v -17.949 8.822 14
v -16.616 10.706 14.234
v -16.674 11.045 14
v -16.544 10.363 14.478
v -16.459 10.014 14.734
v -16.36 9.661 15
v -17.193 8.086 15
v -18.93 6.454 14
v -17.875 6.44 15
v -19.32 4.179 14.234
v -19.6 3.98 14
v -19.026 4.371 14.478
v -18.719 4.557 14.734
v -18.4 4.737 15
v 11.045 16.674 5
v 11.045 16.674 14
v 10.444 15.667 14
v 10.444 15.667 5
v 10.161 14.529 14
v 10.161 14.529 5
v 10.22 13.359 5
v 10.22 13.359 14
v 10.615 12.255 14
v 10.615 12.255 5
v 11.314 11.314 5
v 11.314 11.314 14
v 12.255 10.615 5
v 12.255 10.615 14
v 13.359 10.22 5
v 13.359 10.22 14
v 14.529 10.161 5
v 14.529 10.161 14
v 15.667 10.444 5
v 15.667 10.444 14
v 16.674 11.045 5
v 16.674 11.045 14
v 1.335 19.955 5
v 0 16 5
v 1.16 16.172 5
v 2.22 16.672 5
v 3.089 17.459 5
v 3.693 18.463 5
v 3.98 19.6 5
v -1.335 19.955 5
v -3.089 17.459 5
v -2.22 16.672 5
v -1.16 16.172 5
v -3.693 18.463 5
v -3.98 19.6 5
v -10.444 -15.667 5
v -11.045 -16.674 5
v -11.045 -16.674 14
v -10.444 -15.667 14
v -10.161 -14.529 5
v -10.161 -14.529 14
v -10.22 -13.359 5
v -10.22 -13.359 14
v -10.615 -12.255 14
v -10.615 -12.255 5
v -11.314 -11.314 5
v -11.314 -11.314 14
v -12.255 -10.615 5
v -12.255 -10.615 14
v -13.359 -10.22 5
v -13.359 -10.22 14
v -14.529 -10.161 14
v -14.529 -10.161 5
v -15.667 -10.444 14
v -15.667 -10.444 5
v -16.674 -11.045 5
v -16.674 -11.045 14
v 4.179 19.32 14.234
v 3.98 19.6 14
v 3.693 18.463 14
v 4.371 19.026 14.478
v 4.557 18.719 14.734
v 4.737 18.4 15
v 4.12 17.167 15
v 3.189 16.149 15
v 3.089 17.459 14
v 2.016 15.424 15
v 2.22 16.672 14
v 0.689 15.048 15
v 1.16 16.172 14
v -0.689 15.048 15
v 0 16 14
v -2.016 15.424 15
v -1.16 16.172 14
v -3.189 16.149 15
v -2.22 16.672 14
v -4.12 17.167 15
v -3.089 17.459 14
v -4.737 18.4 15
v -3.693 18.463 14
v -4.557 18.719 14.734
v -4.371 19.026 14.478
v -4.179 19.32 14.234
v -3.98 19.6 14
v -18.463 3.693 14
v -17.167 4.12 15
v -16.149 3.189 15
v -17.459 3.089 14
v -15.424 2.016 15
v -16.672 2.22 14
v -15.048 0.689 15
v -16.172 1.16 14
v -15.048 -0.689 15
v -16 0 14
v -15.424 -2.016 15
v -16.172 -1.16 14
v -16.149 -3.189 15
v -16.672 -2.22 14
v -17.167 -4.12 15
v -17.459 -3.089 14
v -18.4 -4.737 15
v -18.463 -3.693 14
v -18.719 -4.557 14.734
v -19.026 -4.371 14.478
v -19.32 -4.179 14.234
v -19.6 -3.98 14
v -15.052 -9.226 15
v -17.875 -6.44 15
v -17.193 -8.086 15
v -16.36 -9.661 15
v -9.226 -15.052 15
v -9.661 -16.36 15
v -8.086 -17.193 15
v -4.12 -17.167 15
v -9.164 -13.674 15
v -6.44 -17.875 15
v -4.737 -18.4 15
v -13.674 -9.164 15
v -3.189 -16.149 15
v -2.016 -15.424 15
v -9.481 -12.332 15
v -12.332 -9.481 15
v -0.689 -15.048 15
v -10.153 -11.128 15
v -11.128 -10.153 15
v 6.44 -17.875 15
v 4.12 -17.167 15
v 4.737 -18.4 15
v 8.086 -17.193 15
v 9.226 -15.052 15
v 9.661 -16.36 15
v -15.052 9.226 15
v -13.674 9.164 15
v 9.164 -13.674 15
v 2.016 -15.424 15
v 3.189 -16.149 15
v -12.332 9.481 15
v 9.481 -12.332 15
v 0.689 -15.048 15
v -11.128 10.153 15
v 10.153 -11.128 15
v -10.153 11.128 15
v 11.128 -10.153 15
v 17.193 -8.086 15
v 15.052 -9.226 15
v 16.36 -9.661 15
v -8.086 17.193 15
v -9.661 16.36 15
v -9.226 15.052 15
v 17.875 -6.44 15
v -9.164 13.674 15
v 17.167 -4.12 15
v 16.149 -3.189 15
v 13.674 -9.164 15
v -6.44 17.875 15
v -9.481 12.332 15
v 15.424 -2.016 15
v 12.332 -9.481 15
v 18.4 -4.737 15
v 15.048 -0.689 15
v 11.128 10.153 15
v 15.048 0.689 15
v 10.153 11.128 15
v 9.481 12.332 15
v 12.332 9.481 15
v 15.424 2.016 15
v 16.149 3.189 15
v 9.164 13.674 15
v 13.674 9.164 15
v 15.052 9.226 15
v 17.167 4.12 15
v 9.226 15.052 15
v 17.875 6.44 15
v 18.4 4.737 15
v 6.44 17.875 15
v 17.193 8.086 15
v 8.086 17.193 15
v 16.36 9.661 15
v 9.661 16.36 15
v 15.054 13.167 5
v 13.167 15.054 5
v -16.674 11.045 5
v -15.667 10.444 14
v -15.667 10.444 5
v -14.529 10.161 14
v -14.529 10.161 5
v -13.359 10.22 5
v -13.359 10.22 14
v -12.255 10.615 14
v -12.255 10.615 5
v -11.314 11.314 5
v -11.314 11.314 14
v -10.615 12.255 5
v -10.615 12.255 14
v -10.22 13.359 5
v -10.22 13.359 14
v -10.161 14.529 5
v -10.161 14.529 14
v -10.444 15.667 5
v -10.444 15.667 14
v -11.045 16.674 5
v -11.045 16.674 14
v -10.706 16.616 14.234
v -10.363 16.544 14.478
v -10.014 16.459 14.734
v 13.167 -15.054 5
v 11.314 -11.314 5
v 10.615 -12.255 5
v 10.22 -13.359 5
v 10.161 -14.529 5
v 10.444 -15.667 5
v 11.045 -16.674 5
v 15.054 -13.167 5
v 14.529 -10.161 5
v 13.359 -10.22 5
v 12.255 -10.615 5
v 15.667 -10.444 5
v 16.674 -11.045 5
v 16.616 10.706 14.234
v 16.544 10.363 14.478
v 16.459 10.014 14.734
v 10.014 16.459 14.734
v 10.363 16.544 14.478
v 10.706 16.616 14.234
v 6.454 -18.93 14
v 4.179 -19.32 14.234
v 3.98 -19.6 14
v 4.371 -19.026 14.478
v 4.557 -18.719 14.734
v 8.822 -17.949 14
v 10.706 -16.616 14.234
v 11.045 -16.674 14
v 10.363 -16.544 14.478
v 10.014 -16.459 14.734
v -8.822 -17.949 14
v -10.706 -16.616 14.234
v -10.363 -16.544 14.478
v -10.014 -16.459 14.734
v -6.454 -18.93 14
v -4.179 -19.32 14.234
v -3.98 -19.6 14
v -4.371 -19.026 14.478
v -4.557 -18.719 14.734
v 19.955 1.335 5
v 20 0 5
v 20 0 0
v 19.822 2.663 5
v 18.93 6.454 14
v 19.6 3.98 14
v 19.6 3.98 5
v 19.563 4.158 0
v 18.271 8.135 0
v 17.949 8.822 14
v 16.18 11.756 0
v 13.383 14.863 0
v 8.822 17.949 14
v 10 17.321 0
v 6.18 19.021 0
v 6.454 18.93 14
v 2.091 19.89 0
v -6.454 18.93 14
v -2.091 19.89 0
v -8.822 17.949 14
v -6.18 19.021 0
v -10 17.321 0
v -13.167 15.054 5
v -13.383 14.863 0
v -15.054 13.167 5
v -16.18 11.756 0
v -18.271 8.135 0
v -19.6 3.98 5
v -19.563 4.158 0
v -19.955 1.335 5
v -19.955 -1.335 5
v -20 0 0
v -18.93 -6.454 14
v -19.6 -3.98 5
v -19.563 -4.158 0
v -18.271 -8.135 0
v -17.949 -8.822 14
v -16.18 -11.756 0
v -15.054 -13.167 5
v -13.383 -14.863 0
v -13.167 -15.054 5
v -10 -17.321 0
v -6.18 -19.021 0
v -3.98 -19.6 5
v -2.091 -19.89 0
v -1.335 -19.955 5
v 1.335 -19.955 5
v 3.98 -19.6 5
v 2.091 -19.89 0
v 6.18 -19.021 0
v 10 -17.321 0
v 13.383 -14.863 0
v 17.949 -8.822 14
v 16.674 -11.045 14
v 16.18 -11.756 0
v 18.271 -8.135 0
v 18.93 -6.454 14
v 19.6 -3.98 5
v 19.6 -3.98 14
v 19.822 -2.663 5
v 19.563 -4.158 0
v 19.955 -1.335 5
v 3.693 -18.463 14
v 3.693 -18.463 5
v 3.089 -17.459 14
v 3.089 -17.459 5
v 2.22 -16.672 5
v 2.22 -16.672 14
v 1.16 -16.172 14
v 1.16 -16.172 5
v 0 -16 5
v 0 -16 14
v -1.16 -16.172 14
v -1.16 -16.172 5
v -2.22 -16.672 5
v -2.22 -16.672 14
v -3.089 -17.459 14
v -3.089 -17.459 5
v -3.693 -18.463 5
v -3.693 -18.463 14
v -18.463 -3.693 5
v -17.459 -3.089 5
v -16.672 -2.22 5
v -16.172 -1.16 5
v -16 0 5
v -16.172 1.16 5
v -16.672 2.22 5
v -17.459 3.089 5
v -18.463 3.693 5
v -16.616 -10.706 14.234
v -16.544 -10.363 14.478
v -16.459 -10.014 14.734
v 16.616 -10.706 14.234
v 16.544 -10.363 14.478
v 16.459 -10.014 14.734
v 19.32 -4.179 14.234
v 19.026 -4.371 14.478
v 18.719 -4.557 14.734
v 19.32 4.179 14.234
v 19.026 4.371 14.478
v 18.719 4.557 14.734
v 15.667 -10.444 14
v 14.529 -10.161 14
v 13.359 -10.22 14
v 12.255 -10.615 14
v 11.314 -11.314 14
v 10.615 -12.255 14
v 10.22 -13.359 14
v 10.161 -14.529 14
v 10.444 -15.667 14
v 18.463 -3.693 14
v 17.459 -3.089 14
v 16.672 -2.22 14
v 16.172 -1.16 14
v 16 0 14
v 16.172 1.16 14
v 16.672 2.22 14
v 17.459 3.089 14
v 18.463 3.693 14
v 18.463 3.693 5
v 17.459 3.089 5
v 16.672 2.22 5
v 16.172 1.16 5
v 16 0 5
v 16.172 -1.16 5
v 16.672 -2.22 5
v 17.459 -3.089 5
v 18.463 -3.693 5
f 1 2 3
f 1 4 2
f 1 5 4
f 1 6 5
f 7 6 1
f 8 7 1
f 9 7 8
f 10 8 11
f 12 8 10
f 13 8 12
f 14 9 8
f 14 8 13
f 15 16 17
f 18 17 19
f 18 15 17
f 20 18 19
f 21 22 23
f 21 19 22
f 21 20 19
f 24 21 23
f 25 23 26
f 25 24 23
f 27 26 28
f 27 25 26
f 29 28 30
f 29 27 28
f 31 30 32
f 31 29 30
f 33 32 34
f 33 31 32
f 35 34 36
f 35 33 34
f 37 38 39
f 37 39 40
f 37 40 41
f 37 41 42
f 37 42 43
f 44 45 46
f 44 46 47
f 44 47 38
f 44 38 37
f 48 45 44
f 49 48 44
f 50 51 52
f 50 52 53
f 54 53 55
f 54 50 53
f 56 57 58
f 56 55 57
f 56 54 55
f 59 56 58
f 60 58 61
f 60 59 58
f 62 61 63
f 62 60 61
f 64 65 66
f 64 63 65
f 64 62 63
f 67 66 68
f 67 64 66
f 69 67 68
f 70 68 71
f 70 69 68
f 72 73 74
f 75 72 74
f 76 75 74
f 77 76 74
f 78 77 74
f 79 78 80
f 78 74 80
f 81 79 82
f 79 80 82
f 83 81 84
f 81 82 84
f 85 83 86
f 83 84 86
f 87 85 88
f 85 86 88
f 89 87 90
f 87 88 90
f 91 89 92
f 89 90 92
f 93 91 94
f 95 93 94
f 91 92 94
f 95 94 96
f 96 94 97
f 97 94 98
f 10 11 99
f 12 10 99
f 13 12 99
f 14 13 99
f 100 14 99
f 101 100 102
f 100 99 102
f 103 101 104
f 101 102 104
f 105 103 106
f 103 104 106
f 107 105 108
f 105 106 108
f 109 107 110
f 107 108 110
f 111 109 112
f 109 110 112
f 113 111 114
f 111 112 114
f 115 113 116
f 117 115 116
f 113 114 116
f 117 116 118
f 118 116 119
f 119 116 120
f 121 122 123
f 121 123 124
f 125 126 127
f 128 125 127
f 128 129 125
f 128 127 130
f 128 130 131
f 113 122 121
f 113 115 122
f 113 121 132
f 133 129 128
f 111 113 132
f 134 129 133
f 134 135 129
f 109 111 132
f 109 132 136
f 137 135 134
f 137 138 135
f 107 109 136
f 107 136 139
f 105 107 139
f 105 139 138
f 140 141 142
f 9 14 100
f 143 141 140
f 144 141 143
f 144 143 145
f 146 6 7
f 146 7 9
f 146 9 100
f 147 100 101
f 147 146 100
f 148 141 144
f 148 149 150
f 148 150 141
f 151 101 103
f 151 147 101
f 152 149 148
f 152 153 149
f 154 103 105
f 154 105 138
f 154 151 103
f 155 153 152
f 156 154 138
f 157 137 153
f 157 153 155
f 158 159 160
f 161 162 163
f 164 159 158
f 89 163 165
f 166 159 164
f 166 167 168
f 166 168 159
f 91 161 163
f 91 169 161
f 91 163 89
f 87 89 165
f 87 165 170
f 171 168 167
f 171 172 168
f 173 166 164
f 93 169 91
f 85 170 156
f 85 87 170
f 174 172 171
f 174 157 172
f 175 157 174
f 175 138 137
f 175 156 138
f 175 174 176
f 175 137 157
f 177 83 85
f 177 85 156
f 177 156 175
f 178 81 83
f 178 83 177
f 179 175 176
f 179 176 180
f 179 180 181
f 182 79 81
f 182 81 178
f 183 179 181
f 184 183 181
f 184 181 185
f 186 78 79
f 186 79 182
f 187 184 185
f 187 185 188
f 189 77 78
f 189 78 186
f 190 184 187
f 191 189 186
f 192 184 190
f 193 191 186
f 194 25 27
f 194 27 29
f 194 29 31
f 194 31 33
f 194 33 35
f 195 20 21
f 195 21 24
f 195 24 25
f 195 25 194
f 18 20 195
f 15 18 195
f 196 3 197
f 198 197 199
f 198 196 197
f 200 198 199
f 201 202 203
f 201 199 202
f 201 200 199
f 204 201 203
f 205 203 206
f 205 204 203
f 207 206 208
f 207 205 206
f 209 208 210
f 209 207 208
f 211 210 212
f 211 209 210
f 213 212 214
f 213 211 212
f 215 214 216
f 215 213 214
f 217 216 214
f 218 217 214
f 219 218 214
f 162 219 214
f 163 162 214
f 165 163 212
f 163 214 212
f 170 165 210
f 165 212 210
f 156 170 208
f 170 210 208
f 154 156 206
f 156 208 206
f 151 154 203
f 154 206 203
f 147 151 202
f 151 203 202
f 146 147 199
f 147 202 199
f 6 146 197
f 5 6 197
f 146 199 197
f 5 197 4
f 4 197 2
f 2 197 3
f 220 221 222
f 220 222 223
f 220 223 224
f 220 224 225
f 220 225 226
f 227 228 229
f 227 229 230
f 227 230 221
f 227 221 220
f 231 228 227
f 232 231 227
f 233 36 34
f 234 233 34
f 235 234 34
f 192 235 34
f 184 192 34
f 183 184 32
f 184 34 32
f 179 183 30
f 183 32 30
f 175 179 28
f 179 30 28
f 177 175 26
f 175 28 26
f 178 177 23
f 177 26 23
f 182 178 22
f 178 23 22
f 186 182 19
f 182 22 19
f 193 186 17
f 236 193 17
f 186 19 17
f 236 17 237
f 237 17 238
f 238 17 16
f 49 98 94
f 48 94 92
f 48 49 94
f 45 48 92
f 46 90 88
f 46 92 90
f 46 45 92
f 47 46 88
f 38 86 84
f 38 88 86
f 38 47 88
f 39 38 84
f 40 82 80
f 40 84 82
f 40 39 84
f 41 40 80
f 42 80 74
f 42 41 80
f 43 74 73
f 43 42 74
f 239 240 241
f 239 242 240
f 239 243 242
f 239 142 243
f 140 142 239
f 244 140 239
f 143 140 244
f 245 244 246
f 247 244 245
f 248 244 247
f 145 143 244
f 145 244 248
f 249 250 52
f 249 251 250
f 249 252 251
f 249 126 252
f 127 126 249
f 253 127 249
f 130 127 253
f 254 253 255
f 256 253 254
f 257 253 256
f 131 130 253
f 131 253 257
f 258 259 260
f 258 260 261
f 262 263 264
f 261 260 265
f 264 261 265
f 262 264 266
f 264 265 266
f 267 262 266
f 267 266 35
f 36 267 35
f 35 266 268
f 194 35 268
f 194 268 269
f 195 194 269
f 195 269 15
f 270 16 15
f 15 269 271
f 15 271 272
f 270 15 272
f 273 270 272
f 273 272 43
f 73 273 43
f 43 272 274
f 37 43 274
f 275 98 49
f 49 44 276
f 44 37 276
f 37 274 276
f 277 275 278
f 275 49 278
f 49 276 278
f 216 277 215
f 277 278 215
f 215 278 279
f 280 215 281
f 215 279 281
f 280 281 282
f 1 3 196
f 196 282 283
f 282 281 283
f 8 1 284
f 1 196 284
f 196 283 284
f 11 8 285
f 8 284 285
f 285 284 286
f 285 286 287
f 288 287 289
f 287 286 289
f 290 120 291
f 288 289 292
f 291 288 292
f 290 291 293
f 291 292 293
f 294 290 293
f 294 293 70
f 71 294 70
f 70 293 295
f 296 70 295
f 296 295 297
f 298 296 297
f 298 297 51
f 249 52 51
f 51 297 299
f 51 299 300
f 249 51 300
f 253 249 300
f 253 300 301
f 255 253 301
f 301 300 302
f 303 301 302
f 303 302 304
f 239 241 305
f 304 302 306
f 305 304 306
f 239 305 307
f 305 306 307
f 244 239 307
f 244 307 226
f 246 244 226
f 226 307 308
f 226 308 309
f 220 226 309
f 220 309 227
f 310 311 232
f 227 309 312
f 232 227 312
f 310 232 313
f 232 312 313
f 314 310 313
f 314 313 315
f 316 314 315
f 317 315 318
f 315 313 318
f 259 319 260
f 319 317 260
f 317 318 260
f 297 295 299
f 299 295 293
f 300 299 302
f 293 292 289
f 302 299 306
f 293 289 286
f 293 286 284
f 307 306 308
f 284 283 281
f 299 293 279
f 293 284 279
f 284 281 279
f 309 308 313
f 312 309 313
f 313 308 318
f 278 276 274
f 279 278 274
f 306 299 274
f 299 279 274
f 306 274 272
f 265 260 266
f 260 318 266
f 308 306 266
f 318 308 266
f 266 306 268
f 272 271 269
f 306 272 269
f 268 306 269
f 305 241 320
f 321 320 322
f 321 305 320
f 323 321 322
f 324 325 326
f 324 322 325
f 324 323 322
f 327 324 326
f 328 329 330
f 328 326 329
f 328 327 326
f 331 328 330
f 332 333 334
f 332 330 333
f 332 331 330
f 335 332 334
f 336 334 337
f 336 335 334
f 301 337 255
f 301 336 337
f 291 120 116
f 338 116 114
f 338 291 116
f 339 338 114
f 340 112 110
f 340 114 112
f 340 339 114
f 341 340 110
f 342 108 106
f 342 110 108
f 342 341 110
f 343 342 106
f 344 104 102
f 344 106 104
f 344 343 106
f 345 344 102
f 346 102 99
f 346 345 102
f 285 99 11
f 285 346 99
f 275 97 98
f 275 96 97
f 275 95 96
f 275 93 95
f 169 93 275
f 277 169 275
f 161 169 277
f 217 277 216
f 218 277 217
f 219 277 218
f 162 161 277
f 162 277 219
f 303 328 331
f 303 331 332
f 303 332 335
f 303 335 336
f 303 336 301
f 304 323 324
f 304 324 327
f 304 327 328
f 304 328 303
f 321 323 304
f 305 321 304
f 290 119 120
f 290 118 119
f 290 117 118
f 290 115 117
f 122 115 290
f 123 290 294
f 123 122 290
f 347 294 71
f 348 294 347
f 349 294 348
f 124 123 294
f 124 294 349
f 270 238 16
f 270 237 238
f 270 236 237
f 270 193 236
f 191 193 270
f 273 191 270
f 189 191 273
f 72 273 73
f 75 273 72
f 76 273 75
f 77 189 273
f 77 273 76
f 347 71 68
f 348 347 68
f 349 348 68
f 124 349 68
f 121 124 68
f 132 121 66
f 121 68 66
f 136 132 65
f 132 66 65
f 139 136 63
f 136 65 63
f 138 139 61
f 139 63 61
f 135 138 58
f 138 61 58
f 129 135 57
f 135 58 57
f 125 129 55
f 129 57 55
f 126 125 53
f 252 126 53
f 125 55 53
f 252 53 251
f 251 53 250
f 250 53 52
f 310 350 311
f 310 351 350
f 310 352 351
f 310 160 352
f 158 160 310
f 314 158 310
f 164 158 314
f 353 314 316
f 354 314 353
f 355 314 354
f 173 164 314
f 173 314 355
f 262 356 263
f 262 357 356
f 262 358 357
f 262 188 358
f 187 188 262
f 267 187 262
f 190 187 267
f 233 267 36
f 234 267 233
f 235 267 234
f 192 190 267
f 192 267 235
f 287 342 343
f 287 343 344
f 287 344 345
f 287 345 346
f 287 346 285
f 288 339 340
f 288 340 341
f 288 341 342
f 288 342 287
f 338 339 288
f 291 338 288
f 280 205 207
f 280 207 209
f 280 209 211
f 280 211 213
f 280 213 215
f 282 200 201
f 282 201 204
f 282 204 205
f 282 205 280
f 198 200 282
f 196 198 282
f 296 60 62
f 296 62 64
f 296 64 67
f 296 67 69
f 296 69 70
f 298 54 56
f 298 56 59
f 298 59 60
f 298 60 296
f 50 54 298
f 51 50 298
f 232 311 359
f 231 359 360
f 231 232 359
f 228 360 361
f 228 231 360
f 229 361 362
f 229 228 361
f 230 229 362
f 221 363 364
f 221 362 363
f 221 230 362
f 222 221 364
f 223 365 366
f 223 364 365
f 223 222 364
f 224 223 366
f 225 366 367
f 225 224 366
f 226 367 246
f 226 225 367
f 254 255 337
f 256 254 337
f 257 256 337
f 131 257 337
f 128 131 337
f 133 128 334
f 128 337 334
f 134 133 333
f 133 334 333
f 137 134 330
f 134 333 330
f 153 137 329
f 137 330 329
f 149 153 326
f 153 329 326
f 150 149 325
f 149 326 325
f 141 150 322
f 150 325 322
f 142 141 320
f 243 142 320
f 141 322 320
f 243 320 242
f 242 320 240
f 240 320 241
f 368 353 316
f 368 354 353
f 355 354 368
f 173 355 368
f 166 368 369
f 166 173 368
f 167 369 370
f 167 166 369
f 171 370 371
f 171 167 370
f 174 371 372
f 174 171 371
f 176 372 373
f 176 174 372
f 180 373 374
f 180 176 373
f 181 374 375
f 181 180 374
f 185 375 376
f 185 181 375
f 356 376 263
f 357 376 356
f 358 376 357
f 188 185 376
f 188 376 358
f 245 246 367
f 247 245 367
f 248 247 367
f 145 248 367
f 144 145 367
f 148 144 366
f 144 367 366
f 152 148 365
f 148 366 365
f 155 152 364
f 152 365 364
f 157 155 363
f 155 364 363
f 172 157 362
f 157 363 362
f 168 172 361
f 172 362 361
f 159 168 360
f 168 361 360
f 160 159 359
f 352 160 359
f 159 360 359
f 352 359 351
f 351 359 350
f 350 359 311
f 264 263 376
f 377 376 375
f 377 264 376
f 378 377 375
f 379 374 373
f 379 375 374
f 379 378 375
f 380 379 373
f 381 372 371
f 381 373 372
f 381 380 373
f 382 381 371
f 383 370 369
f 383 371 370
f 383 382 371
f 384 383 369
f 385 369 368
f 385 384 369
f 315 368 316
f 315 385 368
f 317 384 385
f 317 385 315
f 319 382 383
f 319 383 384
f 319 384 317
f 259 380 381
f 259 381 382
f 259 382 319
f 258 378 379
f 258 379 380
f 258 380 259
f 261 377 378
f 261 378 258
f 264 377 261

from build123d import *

# Parameters (mm, degrees)
CYLINDER001_R               = 4
CYLINDER001_DEPTH           = 13
CYLINDER001_PLACEMENT_ANGLE = 2
ARRAY_COUNT                 = 8
CYLINDER_R                  = 20
CYLINDER_DEPTH              = 15
CHAMFER_SIZE                = 1


with BuildPart() as array:
    # Cylinder001 → Cylinder001 (new body)
    with BuildSketch(Plane.XY):
        Circle(CYLINDER001_R)
    extrude(amount=CYLINDER001_DEPTH)


with BuildPart() as array_1:
    # Cylinder001 placement: moved
    add(array.part.moved(Location((20, 0, 5))).rotate(Axis((20, 0, 5), (0, 0, -1)), CYLINDER001_PLACEMENT_ANGLE))

    # Array: Array ×8 about axis
    array_axis = Axis((0, 0, 0), (0, 0, 1))


with BuildPart() as array_2:
    add(array_1.part)
    for i in range(1, ARRAY_COUNT):
        add(array_1.part.rotate(array_axis, i * 360 / ARRAY_COUNT))


with BuildPart() as chamfer_body:
    # Cylinder → Cylinder (new body)
    with BuildSketch(Plane.XY):
        Circle(CYLINDER_R)
    extrude(amount=CYLINDER_DEPTH)

    # Cut: cut Array
    add(array_2.part, mode=Mode.SUBTRACT)

    # Chamfer
    chamfer_edges = [chamfer_body.edges().sort_by_distance(p)[0] for p in [
        (18.477591, 7.653669, 15),
        (7.653669, 18.477591, 15),
        (-7.653669, 18.477591, 15),
        (-18.477591, 7.653669, 15),
        (-18.477591, -7.653669, 15),
        (-7.653669, -18.477591, 15),
        (7.653669, -18.477591, 15),
        (18.477591, -7.653669, 15),
        (16, 0, 15),
        (11.313708, -11.313708, 15),
        (0, -16, 15),
        (-11.313708, -11.313708, 15),
        (-16, 0, 15),
        (-11.313708, 11.313708, 15),
        (0, 16, 15),
        (11.313708, 11.313708, 15),
    ]]
    chamfer(chamfer_edges, length=CHAMFER_SIZE)


solid = chamfer_body.part
